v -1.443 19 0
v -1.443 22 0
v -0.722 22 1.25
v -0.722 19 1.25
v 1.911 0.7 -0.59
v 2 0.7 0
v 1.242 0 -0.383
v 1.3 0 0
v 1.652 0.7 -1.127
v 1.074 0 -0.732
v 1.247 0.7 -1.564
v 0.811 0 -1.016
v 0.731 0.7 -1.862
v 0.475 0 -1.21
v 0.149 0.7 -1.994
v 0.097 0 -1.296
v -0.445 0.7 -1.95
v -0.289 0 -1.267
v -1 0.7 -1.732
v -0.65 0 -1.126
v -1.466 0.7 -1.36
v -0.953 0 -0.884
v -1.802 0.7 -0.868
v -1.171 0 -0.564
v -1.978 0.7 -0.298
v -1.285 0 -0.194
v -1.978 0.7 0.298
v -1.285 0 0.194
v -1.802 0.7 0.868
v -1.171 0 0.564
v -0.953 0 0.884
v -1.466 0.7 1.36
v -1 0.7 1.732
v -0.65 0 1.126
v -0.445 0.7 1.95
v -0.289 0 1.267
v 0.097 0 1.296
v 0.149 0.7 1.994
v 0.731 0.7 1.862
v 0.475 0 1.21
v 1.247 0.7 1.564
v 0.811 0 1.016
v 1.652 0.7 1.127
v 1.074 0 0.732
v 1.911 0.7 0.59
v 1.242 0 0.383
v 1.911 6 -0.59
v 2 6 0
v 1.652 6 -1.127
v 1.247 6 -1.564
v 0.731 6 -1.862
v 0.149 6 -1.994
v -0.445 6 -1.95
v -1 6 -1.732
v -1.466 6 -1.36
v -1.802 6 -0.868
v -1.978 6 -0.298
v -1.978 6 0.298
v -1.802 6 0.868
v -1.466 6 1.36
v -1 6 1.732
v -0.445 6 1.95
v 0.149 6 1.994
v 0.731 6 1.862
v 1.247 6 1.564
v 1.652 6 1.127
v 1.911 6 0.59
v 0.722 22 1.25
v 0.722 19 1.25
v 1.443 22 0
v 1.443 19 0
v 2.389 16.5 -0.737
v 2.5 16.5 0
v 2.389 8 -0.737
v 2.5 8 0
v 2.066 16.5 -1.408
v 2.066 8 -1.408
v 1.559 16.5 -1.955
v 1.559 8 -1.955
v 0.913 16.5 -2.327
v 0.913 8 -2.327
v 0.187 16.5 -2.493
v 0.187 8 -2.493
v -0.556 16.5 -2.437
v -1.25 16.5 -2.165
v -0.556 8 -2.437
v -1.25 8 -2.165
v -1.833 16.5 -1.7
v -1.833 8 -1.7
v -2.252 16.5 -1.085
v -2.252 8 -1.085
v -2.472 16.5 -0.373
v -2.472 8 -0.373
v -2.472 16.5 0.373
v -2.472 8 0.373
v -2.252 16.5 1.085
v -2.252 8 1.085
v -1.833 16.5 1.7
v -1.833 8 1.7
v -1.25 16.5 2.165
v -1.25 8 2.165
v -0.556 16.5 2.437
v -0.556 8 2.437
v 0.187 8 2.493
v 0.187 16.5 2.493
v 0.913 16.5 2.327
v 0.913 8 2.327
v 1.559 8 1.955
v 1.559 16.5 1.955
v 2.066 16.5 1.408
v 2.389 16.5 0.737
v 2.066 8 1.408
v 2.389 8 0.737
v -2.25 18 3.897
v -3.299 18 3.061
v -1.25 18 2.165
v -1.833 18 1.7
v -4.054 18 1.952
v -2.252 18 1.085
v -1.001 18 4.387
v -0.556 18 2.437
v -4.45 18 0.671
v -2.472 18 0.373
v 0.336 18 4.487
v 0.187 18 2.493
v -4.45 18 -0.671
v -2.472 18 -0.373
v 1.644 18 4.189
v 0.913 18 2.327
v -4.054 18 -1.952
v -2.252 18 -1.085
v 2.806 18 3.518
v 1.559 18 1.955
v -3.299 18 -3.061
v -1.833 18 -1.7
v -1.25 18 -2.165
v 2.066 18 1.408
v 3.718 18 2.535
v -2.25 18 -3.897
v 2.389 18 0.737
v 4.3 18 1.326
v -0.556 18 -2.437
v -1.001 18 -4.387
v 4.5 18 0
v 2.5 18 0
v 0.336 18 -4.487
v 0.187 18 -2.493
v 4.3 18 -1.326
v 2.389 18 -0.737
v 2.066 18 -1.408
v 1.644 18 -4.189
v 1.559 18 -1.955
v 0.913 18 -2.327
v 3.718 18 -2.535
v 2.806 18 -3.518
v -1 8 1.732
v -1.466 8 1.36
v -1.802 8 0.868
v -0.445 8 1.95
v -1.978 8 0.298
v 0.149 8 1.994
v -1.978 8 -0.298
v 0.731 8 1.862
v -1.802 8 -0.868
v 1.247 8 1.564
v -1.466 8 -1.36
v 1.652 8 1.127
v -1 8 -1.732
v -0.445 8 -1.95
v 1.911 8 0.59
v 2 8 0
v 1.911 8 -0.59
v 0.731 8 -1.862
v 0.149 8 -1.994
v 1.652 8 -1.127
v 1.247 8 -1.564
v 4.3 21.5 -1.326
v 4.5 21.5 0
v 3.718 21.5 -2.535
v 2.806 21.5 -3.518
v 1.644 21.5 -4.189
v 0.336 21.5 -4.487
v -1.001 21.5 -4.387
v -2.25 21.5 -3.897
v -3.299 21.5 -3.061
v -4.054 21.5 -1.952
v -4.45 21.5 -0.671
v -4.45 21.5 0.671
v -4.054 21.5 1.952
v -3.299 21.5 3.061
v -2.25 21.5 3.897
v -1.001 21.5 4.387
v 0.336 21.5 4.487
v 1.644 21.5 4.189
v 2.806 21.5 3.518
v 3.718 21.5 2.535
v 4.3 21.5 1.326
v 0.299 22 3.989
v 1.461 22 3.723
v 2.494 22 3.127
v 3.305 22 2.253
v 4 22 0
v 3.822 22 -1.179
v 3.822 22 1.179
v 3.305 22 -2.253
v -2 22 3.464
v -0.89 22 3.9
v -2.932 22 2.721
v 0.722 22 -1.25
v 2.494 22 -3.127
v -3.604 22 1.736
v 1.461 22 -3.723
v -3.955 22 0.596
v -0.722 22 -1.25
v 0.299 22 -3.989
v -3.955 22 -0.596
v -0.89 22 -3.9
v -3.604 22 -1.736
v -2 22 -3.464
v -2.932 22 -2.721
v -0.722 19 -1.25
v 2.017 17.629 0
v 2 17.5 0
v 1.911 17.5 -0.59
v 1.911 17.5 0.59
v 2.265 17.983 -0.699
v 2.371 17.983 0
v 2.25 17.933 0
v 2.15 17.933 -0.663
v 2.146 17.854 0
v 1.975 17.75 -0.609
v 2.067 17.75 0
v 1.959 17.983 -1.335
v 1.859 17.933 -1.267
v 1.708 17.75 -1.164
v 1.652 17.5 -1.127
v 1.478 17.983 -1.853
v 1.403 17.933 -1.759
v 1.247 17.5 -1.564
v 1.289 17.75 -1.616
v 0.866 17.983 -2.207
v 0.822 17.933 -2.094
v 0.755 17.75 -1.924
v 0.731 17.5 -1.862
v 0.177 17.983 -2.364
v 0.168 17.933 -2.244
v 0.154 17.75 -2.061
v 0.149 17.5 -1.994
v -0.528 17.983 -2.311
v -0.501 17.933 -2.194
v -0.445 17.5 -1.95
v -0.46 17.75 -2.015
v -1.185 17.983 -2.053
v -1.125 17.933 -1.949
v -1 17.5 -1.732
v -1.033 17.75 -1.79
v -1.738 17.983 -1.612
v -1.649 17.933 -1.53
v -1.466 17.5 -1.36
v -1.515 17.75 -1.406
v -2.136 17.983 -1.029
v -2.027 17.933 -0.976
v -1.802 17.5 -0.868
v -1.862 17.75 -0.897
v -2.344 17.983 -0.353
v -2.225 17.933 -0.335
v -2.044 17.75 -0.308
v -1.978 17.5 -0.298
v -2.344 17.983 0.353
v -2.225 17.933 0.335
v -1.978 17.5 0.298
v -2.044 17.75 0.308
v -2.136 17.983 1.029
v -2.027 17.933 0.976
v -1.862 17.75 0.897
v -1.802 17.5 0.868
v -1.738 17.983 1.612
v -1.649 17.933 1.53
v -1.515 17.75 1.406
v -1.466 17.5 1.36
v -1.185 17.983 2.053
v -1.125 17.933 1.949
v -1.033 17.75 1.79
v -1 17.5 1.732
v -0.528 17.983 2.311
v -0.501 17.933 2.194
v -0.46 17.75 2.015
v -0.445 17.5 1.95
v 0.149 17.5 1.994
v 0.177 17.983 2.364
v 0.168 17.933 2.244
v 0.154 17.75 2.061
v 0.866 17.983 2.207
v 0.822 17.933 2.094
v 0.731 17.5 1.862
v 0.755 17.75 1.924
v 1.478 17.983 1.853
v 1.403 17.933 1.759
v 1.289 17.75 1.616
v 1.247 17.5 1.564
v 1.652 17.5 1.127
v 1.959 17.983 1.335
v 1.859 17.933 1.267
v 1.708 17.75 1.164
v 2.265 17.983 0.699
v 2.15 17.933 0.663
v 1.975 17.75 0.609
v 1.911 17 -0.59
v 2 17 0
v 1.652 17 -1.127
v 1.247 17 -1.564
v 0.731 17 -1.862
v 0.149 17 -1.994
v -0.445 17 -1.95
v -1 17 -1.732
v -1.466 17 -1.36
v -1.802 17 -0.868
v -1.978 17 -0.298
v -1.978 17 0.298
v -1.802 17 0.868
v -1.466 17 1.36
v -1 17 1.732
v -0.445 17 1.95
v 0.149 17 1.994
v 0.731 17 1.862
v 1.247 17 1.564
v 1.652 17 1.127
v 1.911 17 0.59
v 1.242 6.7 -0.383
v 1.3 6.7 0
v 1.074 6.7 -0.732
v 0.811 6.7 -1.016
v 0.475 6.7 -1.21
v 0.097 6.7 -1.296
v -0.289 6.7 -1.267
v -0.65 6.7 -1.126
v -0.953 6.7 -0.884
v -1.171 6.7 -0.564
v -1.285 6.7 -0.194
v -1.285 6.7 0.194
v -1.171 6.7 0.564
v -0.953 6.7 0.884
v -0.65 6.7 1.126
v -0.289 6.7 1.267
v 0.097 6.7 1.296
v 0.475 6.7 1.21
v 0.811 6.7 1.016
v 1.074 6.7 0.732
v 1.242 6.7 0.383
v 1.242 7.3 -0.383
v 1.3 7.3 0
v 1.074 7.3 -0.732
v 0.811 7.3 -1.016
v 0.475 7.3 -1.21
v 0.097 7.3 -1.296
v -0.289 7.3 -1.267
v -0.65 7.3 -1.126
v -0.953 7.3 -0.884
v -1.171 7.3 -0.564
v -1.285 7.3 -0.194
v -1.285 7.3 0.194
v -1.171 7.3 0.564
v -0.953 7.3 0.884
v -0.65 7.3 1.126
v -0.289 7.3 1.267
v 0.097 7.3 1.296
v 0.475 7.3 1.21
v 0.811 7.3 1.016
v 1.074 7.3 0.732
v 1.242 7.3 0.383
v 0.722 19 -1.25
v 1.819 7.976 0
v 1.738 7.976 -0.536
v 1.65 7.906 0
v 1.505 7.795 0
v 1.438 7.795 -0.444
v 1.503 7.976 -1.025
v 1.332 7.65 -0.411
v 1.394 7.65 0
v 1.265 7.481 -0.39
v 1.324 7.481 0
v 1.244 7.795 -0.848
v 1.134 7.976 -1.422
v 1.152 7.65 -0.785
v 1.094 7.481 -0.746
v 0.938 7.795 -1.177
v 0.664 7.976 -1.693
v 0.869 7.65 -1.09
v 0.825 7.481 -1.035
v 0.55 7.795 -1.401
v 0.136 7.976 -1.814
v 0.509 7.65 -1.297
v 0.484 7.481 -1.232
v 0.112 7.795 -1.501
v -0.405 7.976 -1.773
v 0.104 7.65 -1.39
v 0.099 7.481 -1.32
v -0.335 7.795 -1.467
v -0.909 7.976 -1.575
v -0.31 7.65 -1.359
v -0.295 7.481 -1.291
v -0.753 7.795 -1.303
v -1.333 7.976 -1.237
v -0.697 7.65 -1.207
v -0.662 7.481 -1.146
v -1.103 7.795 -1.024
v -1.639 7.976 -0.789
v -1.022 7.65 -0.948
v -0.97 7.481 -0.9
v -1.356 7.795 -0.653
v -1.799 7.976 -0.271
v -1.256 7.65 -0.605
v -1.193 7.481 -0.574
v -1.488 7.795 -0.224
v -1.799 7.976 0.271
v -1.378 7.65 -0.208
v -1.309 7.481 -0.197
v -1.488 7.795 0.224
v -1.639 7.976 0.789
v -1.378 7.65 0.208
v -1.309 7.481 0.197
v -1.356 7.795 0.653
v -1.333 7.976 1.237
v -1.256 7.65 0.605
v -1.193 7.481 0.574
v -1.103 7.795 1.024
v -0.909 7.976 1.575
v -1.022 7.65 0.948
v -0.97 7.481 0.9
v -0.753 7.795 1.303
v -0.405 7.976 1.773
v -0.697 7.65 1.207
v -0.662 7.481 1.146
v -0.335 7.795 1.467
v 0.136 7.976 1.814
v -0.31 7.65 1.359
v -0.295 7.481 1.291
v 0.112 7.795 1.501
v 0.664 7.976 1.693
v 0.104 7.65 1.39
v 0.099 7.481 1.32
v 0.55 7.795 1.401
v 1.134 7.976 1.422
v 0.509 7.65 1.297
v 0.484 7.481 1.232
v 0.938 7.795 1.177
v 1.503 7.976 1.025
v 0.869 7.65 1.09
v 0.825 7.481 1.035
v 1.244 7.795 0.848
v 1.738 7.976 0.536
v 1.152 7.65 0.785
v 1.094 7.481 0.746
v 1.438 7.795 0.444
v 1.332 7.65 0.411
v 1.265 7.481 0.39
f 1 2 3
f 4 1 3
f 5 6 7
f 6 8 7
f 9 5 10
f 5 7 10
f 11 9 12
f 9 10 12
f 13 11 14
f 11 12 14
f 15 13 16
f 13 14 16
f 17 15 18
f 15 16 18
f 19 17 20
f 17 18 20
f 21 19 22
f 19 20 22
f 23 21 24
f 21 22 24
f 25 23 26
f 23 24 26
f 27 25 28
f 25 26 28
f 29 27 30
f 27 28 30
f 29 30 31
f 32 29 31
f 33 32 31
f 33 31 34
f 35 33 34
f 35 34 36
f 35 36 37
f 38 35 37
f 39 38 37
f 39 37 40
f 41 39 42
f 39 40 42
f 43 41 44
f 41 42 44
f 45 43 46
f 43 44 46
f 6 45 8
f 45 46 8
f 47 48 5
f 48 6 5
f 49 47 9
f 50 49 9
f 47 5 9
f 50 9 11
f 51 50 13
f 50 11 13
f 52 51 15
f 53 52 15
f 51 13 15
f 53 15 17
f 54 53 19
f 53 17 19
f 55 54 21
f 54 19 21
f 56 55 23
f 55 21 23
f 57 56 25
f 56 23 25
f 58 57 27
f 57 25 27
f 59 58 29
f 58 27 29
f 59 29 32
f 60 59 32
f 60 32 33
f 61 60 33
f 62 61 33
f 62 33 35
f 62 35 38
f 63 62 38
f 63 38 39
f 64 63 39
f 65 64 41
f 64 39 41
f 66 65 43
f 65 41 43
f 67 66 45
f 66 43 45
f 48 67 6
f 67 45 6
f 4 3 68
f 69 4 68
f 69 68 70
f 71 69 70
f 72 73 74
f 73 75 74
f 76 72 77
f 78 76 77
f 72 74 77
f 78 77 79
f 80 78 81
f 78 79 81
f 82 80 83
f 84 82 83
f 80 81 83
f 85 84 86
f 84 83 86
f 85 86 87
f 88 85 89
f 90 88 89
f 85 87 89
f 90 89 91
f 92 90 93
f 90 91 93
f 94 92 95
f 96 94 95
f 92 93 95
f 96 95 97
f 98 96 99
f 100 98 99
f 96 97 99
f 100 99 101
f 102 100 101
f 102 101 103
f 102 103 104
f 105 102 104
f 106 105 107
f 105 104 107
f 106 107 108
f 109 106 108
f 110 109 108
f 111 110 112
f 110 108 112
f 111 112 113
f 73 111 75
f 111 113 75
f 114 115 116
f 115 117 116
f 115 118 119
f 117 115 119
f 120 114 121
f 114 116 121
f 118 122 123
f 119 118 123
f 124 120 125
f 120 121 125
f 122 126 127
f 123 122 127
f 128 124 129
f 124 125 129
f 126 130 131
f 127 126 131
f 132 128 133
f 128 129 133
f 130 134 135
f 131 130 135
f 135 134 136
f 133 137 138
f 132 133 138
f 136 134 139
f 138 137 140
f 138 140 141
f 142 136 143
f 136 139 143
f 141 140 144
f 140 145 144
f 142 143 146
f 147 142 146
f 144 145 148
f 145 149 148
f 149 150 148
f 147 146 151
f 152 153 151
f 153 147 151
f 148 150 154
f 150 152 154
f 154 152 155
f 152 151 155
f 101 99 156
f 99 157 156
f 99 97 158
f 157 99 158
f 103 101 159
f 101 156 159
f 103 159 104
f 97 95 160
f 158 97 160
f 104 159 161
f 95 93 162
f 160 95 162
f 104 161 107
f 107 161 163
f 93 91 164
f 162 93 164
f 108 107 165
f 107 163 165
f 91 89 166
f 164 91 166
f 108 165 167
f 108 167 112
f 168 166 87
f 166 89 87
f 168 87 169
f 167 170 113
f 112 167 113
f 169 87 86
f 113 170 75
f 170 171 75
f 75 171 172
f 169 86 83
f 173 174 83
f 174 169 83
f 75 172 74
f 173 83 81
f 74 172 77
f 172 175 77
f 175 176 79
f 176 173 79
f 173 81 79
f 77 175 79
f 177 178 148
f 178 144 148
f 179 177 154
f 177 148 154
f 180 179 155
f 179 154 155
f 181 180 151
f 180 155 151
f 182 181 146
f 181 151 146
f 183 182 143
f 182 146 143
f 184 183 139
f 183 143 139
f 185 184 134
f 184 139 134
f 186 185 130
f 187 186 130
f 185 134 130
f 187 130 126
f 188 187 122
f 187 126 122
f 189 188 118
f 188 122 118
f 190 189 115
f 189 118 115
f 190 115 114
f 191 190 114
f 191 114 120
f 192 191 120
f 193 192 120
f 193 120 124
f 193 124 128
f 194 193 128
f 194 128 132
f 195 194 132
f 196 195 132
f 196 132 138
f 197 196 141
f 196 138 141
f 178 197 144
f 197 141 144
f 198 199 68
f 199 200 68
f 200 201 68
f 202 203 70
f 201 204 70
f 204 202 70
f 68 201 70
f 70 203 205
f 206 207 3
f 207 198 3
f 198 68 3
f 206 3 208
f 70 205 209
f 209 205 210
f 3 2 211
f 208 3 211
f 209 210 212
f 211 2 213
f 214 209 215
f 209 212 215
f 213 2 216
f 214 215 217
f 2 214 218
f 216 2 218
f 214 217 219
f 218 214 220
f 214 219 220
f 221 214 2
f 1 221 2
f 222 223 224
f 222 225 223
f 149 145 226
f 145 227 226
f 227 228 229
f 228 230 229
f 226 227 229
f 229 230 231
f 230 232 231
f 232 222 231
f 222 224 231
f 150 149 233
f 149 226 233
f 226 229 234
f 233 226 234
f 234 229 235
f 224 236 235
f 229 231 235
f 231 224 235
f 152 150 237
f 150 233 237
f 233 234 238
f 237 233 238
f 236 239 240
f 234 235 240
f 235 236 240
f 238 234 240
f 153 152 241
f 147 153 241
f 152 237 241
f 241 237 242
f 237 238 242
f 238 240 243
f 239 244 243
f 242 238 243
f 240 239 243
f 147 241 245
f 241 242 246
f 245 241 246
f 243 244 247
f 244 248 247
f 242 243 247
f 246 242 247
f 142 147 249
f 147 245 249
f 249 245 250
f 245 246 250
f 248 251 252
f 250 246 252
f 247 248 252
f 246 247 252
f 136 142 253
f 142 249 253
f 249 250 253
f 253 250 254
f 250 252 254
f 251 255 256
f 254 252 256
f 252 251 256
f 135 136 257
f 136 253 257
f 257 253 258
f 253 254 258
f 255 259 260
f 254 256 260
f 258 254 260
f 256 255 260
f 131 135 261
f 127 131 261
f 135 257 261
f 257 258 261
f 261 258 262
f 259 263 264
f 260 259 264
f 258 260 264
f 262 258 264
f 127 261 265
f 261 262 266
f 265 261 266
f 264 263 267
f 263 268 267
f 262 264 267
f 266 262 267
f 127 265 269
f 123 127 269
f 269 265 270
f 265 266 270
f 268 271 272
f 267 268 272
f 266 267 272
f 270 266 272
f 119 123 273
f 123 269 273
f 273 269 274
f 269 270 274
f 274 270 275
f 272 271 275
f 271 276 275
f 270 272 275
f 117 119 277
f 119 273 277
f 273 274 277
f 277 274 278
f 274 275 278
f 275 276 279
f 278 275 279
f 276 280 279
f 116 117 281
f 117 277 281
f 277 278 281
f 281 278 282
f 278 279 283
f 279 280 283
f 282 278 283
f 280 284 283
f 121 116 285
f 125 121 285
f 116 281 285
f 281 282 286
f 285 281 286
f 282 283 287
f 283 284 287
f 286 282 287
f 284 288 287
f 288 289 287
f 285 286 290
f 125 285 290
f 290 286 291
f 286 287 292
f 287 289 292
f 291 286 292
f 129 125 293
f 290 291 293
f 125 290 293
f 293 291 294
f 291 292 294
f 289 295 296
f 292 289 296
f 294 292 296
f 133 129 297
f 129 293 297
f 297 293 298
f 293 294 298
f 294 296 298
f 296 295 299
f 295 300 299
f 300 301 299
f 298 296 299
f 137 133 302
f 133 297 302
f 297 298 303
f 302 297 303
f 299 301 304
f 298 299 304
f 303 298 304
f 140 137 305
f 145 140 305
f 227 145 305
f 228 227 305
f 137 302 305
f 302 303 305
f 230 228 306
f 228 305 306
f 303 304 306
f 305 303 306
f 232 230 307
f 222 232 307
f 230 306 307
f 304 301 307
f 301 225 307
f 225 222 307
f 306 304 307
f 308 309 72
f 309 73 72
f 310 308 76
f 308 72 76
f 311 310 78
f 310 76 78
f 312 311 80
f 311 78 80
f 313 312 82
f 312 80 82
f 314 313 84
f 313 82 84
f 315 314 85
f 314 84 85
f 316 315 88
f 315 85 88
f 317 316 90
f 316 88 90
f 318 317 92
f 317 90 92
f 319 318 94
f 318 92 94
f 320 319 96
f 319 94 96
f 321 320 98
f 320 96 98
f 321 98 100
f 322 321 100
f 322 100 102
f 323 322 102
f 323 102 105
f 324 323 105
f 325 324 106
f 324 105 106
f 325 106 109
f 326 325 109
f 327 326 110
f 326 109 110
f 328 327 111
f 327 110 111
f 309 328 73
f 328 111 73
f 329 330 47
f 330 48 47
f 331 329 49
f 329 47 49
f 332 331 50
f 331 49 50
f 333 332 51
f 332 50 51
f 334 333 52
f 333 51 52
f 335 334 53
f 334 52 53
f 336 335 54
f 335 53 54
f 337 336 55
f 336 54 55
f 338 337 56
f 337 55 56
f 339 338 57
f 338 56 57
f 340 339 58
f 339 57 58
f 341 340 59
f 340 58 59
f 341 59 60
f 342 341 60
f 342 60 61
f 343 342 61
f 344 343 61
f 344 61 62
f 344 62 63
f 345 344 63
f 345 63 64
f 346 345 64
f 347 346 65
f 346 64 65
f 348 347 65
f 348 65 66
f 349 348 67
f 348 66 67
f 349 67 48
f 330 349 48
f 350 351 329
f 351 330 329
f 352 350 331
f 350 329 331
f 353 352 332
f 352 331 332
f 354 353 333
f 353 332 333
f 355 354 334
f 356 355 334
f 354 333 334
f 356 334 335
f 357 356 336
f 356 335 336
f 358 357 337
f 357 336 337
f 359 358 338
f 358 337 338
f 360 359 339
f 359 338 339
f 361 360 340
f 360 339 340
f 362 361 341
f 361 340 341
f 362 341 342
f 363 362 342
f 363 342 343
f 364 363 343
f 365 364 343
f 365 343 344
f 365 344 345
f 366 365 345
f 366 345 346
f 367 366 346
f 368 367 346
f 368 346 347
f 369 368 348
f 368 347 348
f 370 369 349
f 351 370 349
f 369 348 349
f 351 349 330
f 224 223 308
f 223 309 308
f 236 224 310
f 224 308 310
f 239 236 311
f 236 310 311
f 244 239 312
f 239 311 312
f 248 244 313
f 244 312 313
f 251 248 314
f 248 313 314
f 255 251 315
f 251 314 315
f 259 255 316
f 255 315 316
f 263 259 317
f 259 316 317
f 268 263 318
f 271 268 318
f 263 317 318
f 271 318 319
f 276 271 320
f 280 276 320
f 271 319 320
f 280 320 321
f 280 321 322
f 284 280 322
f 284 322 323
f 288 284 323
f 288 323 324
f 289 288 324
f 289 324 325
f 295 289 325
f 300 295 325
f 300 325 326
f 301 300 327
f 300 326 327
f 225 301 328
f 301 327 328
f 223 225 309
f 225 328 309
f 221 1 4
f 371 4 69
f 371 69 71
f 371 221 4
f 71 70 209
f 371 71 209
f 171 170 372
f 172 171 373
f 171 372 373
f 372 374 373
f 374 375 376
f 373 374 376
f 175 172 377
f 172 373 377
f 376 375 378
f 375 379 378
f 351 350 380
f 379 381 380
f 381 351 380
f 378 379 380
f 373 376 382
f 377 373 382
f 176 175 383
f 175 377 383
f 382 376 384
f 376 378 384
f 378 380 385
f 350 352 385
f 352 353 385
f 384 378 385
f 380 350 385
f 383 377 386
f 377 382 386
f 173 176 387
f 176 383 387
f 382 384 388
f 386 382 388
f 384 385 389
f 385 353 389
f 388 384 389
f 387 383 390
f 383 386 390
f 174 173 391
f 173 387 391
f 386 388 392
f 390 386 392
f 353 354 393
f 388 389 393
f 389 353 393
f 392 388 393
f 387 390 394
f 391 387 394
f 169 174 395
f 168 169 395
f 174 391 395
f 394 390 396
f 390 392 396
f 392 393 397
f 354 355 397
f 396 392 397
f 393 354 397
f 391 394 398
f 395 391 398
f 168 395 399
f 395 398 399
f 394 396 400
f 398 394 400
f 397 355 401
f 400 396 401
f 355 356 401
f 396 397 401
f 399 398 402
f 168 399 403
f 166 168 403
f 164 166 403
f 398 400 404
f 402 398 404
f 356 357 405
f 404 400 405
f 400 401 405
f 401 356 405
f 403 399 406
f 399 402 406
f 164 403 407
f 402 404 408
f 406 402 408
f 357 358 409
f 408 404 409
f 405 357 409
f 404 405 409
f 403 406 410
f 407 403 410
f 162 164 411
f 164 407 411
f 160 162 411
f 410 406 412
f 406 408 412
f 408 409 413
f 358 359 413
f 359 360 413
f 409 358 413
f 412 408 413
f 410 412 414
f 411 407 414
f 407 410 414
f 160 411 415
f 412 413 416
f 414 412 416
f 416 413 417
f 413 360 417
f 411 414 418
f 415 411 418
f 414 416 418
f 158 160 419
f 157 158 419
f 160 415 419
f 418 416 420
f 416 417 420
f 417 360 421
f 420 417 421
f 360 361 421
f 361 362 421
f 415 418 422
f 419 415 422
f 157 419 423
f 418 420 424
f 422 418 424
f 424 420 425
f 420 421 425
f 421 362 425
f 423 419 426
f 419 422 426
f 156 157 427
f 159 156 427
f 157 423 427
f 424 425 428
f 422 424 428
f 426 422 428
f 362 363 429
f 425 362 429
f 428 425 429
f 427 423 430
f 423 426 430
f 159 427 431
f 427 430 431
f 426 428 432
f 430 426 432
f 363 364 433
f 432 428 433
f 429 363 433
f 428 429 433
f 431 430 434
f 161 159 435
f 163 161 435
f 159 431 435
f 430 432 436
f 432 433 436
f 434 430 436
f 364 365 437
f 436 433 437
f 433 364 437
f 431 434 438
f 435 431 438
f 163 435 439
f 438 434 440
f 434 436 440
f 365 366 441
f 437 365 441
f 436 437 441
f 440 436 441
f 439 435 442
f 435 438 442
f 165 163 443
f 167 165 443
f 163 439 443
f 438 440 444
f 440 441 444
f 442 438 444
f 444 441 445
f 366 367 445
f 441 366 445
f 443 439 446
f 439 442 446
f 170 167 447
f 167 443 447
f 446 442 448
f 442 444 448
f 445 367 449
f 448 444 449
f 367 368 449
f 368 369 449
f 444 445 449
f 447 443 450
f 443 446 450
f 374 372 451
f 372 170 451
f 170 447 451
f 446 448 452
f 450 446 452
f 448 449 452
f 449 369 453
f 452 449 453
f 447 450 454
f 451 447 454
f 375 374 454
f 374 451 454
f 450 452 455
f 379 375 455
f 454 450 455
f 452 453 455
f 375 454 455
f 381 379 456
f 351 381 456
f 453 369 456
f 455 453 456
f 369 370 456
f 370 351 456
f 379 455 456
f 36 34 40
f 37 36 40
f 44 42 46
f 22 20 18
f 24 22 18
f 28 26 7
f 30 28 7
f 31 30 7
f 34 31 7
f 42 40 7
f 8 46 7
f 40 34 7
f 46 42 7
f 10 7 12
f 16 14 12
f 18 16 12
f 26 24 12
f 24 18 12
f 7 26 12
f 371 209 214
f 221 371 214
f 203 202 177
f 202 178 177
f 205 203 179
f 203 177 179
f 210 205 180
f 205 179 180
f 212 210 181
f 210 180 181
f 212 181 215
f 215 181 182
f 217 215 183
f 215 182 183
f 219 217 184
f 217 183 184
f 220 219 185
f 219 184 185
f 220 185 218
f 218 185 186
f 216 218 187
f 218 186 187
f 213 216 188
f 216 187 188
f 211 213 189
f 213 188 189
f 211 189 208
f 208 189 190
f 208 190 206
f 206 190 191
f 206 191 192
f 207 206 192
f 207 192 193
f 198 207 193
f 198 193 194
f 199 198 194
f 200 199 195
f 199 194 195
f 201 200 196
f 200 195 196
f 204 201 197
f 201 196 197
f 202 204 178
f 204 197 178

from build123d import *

# Parameters (mm, degrees)
CUT_EXTRUDE1_DEPTH = 3


with BuildPart() as part:
    # Sketch1 → Revolve1 (revolve)
    with BuildSketch(Plane.XY):
        with BuildLine():
            Line((0, 0), (0, 22))
            Line((0, 22), (4, 22))
            Line((4, 22), (4.5, 21.5))
            Line((4.5, 21.5), (4.5, 18))
            Line((4.5, 18), (2.5, 18))
            ThreePointArc((2.5, 18), (2.146446609, 17.853553391), (2, 17.5))
            Line((2, 17.5), (2, 17))
            Line((2, 17), (2.5, 16.5))
            Line((2.5, 16.5), (2.5, 8))
            Line((2.5, 8), (2, 8))
            ThreePointArc((2, 8), (1.505025253, 7.794974747), (1.3, 7.3))
            Line((1.3, 7.3), (1.3, 6.7))
            Line((1.3, 6.7), (2, 6))
            Line((2, 6), (2, 0.7))
            Line((2, 0.7), (1.3, 0))
            Line((1.3, 0), (0, 0))
        make_face()
    revolve(axis=Axis((0, 0, 0), (0, 1, 0)))

    # Sketch2 → Cut-Extrude1 (cut)
    with BuildSketch(Plane(origin=(0, 22, 0), x_dir=(1, 0, 0), z_dir=(0, 1, 0))):
        Polygon((0.721687836, 1.25), (-0.721687836, 1.25), (-1.443375673, 0), (-0.721687836, -1.25), (0.721687836, -1.25), (1.443375673, 0), align=None)
    extrude(amount=-CUT_EXTRUDE1_DEPTH, mode=Mode.SUBTRACT)


solid = part.part
